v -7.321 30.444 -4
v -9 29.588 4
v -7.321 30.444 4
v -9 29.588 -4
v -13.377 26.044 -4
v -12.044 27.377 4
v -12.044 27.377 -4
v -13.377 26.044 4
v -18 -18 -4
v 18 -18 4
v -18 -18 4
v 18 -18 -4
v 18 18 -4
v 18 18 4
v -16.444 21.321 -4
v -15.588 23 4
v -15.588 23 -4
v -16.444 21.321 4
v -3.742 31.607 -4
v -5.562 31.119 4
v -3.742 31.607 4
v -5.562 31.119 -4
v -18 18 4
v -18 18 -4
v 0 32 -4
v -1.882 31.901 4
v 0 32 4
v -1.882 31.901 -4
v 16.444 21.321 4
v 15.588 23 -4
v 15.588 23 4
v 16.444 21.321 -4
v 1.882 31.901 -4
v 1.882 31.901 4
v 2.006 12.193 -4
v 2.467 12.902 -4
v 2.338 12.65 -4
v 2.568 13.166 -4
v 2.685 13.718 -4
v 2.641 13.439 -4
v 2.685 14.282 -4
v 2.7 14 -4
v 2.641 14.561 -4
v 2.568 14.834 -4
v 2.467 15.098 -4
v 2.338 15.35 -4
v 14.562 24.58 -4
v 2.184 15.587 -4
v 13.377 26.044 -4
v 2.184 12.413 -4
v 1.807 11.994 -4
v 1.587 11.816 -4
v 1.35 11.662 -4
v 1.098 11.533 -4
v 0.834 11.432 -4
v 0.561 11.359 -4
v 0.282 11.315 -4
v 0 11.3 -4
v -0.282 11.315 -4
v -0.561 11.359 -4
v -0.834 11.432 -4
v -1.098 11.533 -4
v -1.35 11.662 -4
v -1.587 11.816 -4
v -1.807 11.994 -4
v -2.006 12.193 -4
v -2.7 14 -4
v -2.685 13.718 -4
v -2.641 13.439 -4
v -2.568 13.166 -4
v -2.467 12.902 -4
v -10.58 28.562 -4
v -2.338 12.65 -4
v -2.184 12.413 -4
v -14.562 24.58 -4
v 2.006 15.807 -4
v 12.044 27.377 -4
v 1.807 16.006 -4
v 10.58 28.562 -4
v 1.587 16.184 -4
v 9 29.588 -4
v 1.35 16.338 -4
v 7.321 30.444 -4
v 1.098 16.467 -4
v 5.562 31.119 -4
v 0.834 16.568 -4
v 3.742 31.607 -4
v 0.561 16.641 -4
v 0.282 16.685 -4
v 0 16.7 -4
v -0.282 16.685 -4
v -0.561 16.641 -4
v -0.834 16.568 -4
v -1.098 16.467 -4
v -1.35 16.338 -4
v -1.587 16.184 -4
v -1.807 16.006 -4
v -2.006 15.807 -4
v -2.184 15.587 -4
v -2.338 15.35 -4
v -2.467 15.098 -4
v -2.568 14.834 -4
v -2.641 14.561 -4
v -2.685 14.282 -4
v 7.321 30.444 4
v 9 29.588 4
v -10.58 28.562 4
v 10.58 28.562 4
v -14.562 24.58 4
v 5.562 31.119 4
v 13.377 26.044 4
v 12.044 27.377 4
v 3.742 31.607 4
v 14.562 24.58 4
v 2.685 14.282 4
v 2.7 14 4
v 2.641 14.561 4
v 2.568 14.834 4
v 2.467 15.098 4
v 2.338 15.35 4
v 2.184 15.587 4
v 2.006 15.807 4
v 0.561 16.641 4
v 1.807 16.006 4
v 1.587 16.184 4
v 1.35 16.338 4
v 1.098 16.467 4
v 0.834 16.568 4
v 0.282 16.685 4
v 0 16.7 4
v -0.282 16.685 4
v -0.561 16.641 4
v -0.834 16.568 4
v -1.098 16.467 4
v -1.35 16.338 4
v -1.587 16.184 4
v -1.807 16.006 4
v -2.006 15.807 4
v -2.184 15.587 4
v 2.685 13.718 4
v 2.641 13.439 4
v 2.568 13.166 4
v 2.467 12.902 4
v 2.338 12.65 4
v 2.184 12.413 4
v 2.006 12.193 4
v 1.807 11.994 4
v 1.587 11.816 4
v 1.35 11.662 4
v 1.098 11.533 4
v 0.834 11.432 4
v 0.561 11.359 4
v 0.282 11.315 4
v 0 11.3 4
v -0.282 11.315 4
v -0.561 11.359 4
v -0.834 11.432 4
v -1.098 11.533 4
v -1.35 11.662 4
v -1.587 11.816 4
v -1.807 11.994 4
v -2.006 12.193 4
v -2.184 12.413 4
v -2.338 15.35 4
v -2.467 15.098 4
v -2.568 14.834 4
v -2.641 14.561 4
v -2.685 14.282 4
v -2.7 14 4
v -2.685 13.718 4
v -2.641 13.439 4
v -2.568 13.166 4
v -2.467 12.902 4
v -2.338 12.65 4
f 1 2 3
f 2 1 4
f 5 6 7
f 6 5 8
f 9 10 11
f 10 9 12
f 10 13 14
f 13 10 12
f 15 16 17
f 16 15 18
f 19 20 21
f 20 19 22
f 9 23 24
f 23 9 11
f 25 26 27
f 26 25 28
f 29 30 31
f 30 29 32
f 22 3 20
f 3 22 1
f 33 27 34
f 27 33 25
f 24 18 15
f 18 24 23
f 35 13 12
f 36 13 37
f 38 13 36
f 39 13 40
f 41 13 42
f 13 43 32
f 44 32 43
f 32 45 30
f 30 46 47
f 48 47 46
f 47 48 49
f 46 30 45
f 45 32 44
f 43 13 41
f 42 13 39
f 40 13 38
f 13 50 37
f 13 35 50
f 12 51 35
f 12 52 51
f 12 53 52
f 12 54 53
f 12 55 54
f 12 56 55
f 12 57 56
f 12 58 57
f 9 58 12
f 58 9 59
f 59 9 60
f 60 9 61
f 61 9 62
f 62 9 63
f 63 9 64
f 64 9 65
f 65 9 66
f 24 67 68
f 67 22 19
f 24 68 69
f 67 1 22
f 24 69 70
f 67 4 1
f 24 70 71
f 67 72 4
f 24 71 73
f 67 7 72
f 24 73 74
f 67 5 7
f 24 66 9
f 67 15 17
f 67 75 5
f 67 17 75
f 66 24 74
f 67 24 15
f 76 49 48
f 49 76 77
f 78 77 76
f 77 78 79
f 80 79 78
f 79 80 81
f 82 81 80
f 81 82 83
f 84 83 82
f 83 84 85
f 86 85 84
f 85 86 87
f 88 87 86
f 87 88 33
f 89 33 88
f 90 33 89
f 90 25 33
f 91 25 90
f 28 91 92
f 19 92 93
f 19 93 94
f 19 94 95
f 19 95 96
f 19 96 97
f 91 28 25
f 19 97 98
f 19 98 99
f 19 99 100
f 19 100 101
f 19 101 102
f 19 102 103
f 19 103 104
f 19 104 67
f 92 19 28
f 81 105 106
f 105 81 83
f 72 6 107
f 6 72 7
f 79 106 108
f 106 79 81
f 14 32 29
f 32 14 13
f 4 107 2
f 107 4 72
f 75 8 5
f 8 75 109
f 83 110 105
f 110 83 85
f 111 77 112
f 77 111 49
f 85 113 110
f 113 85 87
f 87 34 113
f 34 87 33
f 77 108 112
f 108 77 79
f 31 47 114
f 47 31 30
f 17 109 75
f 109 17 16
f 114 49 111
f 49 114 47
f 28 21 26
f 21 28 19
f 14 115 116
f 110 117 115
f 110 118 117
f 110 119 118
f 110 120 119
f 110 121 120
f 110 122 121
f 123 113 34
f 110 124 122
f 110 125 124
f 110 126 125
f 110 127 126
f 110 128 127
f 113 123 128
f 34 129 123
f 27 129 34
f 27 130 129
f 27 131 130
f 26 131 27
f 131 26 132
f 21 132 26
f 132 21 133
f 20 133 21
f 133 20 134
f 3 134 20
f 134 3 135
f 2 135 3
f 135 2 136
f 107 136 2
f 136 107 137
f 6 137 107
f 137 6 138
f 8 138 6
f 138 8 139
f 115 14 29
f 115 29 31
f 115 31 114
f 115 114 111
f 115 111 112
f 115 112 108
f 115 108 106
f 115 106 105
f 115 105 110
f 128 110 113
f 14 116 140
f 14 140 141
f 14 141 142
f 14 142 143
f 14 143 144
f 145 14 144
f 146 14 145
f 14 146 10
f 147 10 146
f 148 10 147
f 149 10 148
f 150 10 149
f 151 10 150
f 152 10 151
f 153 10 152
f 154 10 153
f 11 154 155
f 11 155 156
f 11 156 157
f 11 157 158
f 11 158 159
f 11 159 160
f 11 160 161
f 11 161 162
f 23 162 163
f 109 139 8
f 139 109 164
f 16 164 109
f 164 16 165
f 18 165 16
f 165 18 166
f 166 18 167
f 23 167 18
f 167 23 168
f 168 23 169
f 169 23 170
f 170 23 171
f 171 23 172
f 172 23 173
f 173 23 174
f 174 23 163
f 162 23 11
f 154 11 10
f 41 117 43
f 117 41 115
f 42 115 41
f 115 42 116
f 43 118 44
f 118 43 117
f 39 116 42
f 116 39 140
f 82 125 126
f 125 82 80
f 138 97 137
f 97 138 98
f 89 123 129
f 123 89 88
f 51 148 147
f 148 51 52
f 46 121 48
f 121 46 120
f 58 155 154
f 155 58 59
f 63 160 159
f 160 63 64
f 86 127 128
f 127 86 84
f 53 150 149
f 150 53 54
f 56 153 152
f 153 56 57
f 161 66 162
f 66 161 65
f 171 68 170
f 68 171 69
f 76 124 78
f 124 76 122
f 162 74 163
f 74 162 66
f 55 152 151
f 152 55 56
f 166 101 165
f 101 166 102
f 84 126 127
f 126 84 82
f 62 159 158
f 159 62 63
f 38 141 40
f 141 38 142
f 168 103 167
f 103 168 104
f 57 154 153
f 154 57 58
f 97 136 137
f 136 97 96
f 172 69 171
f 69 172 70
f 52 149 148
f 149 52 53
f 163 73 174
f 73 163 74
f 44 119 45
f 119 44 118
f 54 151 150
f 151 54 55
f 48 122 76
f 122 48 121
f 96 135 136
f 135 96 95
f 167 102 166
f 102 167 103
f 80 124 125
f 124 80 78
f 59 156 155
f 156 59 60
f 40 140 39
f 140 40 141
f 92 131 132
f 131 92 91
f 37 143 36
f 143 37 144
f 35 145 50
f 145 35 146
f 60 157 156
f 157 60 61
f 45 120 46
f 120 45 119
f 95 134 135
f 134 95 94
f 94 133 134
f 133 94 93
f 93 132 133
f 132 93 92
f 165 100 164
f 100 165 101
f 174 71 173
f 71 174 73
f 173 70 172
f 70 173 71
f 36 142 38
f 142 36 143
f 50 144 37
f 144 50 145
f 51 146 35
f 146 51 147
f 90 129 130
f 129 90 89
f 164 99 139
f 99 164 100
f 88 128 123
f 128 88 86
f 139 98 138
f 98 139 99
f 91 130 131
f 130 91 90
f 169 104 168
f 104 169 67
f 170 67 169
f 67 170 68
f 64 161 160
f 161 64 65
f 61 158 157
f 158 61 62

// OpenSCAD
// Single-hole mounting tab.
$fn = 60;
eps = 0.02;
tab_w = 36;
tab_h = 64;
tab_t = 8;
hole_d = 5.4;
difference() {
    hull() {
        translate([0, 0, 0]) cube([tab_w, tab_w, tab_t], center = true);
        translate([0, tab_h / 2 - tab_w / 2, 0]) cylinder(d = tab_w, h = tab_t, center = true);
    }
    translate([0, tab_h / 2 - tab_w / 2, -tab_t / 2 - eps]) cylinder(d = hole_d, h = tab_t + 2 * eps);
}
